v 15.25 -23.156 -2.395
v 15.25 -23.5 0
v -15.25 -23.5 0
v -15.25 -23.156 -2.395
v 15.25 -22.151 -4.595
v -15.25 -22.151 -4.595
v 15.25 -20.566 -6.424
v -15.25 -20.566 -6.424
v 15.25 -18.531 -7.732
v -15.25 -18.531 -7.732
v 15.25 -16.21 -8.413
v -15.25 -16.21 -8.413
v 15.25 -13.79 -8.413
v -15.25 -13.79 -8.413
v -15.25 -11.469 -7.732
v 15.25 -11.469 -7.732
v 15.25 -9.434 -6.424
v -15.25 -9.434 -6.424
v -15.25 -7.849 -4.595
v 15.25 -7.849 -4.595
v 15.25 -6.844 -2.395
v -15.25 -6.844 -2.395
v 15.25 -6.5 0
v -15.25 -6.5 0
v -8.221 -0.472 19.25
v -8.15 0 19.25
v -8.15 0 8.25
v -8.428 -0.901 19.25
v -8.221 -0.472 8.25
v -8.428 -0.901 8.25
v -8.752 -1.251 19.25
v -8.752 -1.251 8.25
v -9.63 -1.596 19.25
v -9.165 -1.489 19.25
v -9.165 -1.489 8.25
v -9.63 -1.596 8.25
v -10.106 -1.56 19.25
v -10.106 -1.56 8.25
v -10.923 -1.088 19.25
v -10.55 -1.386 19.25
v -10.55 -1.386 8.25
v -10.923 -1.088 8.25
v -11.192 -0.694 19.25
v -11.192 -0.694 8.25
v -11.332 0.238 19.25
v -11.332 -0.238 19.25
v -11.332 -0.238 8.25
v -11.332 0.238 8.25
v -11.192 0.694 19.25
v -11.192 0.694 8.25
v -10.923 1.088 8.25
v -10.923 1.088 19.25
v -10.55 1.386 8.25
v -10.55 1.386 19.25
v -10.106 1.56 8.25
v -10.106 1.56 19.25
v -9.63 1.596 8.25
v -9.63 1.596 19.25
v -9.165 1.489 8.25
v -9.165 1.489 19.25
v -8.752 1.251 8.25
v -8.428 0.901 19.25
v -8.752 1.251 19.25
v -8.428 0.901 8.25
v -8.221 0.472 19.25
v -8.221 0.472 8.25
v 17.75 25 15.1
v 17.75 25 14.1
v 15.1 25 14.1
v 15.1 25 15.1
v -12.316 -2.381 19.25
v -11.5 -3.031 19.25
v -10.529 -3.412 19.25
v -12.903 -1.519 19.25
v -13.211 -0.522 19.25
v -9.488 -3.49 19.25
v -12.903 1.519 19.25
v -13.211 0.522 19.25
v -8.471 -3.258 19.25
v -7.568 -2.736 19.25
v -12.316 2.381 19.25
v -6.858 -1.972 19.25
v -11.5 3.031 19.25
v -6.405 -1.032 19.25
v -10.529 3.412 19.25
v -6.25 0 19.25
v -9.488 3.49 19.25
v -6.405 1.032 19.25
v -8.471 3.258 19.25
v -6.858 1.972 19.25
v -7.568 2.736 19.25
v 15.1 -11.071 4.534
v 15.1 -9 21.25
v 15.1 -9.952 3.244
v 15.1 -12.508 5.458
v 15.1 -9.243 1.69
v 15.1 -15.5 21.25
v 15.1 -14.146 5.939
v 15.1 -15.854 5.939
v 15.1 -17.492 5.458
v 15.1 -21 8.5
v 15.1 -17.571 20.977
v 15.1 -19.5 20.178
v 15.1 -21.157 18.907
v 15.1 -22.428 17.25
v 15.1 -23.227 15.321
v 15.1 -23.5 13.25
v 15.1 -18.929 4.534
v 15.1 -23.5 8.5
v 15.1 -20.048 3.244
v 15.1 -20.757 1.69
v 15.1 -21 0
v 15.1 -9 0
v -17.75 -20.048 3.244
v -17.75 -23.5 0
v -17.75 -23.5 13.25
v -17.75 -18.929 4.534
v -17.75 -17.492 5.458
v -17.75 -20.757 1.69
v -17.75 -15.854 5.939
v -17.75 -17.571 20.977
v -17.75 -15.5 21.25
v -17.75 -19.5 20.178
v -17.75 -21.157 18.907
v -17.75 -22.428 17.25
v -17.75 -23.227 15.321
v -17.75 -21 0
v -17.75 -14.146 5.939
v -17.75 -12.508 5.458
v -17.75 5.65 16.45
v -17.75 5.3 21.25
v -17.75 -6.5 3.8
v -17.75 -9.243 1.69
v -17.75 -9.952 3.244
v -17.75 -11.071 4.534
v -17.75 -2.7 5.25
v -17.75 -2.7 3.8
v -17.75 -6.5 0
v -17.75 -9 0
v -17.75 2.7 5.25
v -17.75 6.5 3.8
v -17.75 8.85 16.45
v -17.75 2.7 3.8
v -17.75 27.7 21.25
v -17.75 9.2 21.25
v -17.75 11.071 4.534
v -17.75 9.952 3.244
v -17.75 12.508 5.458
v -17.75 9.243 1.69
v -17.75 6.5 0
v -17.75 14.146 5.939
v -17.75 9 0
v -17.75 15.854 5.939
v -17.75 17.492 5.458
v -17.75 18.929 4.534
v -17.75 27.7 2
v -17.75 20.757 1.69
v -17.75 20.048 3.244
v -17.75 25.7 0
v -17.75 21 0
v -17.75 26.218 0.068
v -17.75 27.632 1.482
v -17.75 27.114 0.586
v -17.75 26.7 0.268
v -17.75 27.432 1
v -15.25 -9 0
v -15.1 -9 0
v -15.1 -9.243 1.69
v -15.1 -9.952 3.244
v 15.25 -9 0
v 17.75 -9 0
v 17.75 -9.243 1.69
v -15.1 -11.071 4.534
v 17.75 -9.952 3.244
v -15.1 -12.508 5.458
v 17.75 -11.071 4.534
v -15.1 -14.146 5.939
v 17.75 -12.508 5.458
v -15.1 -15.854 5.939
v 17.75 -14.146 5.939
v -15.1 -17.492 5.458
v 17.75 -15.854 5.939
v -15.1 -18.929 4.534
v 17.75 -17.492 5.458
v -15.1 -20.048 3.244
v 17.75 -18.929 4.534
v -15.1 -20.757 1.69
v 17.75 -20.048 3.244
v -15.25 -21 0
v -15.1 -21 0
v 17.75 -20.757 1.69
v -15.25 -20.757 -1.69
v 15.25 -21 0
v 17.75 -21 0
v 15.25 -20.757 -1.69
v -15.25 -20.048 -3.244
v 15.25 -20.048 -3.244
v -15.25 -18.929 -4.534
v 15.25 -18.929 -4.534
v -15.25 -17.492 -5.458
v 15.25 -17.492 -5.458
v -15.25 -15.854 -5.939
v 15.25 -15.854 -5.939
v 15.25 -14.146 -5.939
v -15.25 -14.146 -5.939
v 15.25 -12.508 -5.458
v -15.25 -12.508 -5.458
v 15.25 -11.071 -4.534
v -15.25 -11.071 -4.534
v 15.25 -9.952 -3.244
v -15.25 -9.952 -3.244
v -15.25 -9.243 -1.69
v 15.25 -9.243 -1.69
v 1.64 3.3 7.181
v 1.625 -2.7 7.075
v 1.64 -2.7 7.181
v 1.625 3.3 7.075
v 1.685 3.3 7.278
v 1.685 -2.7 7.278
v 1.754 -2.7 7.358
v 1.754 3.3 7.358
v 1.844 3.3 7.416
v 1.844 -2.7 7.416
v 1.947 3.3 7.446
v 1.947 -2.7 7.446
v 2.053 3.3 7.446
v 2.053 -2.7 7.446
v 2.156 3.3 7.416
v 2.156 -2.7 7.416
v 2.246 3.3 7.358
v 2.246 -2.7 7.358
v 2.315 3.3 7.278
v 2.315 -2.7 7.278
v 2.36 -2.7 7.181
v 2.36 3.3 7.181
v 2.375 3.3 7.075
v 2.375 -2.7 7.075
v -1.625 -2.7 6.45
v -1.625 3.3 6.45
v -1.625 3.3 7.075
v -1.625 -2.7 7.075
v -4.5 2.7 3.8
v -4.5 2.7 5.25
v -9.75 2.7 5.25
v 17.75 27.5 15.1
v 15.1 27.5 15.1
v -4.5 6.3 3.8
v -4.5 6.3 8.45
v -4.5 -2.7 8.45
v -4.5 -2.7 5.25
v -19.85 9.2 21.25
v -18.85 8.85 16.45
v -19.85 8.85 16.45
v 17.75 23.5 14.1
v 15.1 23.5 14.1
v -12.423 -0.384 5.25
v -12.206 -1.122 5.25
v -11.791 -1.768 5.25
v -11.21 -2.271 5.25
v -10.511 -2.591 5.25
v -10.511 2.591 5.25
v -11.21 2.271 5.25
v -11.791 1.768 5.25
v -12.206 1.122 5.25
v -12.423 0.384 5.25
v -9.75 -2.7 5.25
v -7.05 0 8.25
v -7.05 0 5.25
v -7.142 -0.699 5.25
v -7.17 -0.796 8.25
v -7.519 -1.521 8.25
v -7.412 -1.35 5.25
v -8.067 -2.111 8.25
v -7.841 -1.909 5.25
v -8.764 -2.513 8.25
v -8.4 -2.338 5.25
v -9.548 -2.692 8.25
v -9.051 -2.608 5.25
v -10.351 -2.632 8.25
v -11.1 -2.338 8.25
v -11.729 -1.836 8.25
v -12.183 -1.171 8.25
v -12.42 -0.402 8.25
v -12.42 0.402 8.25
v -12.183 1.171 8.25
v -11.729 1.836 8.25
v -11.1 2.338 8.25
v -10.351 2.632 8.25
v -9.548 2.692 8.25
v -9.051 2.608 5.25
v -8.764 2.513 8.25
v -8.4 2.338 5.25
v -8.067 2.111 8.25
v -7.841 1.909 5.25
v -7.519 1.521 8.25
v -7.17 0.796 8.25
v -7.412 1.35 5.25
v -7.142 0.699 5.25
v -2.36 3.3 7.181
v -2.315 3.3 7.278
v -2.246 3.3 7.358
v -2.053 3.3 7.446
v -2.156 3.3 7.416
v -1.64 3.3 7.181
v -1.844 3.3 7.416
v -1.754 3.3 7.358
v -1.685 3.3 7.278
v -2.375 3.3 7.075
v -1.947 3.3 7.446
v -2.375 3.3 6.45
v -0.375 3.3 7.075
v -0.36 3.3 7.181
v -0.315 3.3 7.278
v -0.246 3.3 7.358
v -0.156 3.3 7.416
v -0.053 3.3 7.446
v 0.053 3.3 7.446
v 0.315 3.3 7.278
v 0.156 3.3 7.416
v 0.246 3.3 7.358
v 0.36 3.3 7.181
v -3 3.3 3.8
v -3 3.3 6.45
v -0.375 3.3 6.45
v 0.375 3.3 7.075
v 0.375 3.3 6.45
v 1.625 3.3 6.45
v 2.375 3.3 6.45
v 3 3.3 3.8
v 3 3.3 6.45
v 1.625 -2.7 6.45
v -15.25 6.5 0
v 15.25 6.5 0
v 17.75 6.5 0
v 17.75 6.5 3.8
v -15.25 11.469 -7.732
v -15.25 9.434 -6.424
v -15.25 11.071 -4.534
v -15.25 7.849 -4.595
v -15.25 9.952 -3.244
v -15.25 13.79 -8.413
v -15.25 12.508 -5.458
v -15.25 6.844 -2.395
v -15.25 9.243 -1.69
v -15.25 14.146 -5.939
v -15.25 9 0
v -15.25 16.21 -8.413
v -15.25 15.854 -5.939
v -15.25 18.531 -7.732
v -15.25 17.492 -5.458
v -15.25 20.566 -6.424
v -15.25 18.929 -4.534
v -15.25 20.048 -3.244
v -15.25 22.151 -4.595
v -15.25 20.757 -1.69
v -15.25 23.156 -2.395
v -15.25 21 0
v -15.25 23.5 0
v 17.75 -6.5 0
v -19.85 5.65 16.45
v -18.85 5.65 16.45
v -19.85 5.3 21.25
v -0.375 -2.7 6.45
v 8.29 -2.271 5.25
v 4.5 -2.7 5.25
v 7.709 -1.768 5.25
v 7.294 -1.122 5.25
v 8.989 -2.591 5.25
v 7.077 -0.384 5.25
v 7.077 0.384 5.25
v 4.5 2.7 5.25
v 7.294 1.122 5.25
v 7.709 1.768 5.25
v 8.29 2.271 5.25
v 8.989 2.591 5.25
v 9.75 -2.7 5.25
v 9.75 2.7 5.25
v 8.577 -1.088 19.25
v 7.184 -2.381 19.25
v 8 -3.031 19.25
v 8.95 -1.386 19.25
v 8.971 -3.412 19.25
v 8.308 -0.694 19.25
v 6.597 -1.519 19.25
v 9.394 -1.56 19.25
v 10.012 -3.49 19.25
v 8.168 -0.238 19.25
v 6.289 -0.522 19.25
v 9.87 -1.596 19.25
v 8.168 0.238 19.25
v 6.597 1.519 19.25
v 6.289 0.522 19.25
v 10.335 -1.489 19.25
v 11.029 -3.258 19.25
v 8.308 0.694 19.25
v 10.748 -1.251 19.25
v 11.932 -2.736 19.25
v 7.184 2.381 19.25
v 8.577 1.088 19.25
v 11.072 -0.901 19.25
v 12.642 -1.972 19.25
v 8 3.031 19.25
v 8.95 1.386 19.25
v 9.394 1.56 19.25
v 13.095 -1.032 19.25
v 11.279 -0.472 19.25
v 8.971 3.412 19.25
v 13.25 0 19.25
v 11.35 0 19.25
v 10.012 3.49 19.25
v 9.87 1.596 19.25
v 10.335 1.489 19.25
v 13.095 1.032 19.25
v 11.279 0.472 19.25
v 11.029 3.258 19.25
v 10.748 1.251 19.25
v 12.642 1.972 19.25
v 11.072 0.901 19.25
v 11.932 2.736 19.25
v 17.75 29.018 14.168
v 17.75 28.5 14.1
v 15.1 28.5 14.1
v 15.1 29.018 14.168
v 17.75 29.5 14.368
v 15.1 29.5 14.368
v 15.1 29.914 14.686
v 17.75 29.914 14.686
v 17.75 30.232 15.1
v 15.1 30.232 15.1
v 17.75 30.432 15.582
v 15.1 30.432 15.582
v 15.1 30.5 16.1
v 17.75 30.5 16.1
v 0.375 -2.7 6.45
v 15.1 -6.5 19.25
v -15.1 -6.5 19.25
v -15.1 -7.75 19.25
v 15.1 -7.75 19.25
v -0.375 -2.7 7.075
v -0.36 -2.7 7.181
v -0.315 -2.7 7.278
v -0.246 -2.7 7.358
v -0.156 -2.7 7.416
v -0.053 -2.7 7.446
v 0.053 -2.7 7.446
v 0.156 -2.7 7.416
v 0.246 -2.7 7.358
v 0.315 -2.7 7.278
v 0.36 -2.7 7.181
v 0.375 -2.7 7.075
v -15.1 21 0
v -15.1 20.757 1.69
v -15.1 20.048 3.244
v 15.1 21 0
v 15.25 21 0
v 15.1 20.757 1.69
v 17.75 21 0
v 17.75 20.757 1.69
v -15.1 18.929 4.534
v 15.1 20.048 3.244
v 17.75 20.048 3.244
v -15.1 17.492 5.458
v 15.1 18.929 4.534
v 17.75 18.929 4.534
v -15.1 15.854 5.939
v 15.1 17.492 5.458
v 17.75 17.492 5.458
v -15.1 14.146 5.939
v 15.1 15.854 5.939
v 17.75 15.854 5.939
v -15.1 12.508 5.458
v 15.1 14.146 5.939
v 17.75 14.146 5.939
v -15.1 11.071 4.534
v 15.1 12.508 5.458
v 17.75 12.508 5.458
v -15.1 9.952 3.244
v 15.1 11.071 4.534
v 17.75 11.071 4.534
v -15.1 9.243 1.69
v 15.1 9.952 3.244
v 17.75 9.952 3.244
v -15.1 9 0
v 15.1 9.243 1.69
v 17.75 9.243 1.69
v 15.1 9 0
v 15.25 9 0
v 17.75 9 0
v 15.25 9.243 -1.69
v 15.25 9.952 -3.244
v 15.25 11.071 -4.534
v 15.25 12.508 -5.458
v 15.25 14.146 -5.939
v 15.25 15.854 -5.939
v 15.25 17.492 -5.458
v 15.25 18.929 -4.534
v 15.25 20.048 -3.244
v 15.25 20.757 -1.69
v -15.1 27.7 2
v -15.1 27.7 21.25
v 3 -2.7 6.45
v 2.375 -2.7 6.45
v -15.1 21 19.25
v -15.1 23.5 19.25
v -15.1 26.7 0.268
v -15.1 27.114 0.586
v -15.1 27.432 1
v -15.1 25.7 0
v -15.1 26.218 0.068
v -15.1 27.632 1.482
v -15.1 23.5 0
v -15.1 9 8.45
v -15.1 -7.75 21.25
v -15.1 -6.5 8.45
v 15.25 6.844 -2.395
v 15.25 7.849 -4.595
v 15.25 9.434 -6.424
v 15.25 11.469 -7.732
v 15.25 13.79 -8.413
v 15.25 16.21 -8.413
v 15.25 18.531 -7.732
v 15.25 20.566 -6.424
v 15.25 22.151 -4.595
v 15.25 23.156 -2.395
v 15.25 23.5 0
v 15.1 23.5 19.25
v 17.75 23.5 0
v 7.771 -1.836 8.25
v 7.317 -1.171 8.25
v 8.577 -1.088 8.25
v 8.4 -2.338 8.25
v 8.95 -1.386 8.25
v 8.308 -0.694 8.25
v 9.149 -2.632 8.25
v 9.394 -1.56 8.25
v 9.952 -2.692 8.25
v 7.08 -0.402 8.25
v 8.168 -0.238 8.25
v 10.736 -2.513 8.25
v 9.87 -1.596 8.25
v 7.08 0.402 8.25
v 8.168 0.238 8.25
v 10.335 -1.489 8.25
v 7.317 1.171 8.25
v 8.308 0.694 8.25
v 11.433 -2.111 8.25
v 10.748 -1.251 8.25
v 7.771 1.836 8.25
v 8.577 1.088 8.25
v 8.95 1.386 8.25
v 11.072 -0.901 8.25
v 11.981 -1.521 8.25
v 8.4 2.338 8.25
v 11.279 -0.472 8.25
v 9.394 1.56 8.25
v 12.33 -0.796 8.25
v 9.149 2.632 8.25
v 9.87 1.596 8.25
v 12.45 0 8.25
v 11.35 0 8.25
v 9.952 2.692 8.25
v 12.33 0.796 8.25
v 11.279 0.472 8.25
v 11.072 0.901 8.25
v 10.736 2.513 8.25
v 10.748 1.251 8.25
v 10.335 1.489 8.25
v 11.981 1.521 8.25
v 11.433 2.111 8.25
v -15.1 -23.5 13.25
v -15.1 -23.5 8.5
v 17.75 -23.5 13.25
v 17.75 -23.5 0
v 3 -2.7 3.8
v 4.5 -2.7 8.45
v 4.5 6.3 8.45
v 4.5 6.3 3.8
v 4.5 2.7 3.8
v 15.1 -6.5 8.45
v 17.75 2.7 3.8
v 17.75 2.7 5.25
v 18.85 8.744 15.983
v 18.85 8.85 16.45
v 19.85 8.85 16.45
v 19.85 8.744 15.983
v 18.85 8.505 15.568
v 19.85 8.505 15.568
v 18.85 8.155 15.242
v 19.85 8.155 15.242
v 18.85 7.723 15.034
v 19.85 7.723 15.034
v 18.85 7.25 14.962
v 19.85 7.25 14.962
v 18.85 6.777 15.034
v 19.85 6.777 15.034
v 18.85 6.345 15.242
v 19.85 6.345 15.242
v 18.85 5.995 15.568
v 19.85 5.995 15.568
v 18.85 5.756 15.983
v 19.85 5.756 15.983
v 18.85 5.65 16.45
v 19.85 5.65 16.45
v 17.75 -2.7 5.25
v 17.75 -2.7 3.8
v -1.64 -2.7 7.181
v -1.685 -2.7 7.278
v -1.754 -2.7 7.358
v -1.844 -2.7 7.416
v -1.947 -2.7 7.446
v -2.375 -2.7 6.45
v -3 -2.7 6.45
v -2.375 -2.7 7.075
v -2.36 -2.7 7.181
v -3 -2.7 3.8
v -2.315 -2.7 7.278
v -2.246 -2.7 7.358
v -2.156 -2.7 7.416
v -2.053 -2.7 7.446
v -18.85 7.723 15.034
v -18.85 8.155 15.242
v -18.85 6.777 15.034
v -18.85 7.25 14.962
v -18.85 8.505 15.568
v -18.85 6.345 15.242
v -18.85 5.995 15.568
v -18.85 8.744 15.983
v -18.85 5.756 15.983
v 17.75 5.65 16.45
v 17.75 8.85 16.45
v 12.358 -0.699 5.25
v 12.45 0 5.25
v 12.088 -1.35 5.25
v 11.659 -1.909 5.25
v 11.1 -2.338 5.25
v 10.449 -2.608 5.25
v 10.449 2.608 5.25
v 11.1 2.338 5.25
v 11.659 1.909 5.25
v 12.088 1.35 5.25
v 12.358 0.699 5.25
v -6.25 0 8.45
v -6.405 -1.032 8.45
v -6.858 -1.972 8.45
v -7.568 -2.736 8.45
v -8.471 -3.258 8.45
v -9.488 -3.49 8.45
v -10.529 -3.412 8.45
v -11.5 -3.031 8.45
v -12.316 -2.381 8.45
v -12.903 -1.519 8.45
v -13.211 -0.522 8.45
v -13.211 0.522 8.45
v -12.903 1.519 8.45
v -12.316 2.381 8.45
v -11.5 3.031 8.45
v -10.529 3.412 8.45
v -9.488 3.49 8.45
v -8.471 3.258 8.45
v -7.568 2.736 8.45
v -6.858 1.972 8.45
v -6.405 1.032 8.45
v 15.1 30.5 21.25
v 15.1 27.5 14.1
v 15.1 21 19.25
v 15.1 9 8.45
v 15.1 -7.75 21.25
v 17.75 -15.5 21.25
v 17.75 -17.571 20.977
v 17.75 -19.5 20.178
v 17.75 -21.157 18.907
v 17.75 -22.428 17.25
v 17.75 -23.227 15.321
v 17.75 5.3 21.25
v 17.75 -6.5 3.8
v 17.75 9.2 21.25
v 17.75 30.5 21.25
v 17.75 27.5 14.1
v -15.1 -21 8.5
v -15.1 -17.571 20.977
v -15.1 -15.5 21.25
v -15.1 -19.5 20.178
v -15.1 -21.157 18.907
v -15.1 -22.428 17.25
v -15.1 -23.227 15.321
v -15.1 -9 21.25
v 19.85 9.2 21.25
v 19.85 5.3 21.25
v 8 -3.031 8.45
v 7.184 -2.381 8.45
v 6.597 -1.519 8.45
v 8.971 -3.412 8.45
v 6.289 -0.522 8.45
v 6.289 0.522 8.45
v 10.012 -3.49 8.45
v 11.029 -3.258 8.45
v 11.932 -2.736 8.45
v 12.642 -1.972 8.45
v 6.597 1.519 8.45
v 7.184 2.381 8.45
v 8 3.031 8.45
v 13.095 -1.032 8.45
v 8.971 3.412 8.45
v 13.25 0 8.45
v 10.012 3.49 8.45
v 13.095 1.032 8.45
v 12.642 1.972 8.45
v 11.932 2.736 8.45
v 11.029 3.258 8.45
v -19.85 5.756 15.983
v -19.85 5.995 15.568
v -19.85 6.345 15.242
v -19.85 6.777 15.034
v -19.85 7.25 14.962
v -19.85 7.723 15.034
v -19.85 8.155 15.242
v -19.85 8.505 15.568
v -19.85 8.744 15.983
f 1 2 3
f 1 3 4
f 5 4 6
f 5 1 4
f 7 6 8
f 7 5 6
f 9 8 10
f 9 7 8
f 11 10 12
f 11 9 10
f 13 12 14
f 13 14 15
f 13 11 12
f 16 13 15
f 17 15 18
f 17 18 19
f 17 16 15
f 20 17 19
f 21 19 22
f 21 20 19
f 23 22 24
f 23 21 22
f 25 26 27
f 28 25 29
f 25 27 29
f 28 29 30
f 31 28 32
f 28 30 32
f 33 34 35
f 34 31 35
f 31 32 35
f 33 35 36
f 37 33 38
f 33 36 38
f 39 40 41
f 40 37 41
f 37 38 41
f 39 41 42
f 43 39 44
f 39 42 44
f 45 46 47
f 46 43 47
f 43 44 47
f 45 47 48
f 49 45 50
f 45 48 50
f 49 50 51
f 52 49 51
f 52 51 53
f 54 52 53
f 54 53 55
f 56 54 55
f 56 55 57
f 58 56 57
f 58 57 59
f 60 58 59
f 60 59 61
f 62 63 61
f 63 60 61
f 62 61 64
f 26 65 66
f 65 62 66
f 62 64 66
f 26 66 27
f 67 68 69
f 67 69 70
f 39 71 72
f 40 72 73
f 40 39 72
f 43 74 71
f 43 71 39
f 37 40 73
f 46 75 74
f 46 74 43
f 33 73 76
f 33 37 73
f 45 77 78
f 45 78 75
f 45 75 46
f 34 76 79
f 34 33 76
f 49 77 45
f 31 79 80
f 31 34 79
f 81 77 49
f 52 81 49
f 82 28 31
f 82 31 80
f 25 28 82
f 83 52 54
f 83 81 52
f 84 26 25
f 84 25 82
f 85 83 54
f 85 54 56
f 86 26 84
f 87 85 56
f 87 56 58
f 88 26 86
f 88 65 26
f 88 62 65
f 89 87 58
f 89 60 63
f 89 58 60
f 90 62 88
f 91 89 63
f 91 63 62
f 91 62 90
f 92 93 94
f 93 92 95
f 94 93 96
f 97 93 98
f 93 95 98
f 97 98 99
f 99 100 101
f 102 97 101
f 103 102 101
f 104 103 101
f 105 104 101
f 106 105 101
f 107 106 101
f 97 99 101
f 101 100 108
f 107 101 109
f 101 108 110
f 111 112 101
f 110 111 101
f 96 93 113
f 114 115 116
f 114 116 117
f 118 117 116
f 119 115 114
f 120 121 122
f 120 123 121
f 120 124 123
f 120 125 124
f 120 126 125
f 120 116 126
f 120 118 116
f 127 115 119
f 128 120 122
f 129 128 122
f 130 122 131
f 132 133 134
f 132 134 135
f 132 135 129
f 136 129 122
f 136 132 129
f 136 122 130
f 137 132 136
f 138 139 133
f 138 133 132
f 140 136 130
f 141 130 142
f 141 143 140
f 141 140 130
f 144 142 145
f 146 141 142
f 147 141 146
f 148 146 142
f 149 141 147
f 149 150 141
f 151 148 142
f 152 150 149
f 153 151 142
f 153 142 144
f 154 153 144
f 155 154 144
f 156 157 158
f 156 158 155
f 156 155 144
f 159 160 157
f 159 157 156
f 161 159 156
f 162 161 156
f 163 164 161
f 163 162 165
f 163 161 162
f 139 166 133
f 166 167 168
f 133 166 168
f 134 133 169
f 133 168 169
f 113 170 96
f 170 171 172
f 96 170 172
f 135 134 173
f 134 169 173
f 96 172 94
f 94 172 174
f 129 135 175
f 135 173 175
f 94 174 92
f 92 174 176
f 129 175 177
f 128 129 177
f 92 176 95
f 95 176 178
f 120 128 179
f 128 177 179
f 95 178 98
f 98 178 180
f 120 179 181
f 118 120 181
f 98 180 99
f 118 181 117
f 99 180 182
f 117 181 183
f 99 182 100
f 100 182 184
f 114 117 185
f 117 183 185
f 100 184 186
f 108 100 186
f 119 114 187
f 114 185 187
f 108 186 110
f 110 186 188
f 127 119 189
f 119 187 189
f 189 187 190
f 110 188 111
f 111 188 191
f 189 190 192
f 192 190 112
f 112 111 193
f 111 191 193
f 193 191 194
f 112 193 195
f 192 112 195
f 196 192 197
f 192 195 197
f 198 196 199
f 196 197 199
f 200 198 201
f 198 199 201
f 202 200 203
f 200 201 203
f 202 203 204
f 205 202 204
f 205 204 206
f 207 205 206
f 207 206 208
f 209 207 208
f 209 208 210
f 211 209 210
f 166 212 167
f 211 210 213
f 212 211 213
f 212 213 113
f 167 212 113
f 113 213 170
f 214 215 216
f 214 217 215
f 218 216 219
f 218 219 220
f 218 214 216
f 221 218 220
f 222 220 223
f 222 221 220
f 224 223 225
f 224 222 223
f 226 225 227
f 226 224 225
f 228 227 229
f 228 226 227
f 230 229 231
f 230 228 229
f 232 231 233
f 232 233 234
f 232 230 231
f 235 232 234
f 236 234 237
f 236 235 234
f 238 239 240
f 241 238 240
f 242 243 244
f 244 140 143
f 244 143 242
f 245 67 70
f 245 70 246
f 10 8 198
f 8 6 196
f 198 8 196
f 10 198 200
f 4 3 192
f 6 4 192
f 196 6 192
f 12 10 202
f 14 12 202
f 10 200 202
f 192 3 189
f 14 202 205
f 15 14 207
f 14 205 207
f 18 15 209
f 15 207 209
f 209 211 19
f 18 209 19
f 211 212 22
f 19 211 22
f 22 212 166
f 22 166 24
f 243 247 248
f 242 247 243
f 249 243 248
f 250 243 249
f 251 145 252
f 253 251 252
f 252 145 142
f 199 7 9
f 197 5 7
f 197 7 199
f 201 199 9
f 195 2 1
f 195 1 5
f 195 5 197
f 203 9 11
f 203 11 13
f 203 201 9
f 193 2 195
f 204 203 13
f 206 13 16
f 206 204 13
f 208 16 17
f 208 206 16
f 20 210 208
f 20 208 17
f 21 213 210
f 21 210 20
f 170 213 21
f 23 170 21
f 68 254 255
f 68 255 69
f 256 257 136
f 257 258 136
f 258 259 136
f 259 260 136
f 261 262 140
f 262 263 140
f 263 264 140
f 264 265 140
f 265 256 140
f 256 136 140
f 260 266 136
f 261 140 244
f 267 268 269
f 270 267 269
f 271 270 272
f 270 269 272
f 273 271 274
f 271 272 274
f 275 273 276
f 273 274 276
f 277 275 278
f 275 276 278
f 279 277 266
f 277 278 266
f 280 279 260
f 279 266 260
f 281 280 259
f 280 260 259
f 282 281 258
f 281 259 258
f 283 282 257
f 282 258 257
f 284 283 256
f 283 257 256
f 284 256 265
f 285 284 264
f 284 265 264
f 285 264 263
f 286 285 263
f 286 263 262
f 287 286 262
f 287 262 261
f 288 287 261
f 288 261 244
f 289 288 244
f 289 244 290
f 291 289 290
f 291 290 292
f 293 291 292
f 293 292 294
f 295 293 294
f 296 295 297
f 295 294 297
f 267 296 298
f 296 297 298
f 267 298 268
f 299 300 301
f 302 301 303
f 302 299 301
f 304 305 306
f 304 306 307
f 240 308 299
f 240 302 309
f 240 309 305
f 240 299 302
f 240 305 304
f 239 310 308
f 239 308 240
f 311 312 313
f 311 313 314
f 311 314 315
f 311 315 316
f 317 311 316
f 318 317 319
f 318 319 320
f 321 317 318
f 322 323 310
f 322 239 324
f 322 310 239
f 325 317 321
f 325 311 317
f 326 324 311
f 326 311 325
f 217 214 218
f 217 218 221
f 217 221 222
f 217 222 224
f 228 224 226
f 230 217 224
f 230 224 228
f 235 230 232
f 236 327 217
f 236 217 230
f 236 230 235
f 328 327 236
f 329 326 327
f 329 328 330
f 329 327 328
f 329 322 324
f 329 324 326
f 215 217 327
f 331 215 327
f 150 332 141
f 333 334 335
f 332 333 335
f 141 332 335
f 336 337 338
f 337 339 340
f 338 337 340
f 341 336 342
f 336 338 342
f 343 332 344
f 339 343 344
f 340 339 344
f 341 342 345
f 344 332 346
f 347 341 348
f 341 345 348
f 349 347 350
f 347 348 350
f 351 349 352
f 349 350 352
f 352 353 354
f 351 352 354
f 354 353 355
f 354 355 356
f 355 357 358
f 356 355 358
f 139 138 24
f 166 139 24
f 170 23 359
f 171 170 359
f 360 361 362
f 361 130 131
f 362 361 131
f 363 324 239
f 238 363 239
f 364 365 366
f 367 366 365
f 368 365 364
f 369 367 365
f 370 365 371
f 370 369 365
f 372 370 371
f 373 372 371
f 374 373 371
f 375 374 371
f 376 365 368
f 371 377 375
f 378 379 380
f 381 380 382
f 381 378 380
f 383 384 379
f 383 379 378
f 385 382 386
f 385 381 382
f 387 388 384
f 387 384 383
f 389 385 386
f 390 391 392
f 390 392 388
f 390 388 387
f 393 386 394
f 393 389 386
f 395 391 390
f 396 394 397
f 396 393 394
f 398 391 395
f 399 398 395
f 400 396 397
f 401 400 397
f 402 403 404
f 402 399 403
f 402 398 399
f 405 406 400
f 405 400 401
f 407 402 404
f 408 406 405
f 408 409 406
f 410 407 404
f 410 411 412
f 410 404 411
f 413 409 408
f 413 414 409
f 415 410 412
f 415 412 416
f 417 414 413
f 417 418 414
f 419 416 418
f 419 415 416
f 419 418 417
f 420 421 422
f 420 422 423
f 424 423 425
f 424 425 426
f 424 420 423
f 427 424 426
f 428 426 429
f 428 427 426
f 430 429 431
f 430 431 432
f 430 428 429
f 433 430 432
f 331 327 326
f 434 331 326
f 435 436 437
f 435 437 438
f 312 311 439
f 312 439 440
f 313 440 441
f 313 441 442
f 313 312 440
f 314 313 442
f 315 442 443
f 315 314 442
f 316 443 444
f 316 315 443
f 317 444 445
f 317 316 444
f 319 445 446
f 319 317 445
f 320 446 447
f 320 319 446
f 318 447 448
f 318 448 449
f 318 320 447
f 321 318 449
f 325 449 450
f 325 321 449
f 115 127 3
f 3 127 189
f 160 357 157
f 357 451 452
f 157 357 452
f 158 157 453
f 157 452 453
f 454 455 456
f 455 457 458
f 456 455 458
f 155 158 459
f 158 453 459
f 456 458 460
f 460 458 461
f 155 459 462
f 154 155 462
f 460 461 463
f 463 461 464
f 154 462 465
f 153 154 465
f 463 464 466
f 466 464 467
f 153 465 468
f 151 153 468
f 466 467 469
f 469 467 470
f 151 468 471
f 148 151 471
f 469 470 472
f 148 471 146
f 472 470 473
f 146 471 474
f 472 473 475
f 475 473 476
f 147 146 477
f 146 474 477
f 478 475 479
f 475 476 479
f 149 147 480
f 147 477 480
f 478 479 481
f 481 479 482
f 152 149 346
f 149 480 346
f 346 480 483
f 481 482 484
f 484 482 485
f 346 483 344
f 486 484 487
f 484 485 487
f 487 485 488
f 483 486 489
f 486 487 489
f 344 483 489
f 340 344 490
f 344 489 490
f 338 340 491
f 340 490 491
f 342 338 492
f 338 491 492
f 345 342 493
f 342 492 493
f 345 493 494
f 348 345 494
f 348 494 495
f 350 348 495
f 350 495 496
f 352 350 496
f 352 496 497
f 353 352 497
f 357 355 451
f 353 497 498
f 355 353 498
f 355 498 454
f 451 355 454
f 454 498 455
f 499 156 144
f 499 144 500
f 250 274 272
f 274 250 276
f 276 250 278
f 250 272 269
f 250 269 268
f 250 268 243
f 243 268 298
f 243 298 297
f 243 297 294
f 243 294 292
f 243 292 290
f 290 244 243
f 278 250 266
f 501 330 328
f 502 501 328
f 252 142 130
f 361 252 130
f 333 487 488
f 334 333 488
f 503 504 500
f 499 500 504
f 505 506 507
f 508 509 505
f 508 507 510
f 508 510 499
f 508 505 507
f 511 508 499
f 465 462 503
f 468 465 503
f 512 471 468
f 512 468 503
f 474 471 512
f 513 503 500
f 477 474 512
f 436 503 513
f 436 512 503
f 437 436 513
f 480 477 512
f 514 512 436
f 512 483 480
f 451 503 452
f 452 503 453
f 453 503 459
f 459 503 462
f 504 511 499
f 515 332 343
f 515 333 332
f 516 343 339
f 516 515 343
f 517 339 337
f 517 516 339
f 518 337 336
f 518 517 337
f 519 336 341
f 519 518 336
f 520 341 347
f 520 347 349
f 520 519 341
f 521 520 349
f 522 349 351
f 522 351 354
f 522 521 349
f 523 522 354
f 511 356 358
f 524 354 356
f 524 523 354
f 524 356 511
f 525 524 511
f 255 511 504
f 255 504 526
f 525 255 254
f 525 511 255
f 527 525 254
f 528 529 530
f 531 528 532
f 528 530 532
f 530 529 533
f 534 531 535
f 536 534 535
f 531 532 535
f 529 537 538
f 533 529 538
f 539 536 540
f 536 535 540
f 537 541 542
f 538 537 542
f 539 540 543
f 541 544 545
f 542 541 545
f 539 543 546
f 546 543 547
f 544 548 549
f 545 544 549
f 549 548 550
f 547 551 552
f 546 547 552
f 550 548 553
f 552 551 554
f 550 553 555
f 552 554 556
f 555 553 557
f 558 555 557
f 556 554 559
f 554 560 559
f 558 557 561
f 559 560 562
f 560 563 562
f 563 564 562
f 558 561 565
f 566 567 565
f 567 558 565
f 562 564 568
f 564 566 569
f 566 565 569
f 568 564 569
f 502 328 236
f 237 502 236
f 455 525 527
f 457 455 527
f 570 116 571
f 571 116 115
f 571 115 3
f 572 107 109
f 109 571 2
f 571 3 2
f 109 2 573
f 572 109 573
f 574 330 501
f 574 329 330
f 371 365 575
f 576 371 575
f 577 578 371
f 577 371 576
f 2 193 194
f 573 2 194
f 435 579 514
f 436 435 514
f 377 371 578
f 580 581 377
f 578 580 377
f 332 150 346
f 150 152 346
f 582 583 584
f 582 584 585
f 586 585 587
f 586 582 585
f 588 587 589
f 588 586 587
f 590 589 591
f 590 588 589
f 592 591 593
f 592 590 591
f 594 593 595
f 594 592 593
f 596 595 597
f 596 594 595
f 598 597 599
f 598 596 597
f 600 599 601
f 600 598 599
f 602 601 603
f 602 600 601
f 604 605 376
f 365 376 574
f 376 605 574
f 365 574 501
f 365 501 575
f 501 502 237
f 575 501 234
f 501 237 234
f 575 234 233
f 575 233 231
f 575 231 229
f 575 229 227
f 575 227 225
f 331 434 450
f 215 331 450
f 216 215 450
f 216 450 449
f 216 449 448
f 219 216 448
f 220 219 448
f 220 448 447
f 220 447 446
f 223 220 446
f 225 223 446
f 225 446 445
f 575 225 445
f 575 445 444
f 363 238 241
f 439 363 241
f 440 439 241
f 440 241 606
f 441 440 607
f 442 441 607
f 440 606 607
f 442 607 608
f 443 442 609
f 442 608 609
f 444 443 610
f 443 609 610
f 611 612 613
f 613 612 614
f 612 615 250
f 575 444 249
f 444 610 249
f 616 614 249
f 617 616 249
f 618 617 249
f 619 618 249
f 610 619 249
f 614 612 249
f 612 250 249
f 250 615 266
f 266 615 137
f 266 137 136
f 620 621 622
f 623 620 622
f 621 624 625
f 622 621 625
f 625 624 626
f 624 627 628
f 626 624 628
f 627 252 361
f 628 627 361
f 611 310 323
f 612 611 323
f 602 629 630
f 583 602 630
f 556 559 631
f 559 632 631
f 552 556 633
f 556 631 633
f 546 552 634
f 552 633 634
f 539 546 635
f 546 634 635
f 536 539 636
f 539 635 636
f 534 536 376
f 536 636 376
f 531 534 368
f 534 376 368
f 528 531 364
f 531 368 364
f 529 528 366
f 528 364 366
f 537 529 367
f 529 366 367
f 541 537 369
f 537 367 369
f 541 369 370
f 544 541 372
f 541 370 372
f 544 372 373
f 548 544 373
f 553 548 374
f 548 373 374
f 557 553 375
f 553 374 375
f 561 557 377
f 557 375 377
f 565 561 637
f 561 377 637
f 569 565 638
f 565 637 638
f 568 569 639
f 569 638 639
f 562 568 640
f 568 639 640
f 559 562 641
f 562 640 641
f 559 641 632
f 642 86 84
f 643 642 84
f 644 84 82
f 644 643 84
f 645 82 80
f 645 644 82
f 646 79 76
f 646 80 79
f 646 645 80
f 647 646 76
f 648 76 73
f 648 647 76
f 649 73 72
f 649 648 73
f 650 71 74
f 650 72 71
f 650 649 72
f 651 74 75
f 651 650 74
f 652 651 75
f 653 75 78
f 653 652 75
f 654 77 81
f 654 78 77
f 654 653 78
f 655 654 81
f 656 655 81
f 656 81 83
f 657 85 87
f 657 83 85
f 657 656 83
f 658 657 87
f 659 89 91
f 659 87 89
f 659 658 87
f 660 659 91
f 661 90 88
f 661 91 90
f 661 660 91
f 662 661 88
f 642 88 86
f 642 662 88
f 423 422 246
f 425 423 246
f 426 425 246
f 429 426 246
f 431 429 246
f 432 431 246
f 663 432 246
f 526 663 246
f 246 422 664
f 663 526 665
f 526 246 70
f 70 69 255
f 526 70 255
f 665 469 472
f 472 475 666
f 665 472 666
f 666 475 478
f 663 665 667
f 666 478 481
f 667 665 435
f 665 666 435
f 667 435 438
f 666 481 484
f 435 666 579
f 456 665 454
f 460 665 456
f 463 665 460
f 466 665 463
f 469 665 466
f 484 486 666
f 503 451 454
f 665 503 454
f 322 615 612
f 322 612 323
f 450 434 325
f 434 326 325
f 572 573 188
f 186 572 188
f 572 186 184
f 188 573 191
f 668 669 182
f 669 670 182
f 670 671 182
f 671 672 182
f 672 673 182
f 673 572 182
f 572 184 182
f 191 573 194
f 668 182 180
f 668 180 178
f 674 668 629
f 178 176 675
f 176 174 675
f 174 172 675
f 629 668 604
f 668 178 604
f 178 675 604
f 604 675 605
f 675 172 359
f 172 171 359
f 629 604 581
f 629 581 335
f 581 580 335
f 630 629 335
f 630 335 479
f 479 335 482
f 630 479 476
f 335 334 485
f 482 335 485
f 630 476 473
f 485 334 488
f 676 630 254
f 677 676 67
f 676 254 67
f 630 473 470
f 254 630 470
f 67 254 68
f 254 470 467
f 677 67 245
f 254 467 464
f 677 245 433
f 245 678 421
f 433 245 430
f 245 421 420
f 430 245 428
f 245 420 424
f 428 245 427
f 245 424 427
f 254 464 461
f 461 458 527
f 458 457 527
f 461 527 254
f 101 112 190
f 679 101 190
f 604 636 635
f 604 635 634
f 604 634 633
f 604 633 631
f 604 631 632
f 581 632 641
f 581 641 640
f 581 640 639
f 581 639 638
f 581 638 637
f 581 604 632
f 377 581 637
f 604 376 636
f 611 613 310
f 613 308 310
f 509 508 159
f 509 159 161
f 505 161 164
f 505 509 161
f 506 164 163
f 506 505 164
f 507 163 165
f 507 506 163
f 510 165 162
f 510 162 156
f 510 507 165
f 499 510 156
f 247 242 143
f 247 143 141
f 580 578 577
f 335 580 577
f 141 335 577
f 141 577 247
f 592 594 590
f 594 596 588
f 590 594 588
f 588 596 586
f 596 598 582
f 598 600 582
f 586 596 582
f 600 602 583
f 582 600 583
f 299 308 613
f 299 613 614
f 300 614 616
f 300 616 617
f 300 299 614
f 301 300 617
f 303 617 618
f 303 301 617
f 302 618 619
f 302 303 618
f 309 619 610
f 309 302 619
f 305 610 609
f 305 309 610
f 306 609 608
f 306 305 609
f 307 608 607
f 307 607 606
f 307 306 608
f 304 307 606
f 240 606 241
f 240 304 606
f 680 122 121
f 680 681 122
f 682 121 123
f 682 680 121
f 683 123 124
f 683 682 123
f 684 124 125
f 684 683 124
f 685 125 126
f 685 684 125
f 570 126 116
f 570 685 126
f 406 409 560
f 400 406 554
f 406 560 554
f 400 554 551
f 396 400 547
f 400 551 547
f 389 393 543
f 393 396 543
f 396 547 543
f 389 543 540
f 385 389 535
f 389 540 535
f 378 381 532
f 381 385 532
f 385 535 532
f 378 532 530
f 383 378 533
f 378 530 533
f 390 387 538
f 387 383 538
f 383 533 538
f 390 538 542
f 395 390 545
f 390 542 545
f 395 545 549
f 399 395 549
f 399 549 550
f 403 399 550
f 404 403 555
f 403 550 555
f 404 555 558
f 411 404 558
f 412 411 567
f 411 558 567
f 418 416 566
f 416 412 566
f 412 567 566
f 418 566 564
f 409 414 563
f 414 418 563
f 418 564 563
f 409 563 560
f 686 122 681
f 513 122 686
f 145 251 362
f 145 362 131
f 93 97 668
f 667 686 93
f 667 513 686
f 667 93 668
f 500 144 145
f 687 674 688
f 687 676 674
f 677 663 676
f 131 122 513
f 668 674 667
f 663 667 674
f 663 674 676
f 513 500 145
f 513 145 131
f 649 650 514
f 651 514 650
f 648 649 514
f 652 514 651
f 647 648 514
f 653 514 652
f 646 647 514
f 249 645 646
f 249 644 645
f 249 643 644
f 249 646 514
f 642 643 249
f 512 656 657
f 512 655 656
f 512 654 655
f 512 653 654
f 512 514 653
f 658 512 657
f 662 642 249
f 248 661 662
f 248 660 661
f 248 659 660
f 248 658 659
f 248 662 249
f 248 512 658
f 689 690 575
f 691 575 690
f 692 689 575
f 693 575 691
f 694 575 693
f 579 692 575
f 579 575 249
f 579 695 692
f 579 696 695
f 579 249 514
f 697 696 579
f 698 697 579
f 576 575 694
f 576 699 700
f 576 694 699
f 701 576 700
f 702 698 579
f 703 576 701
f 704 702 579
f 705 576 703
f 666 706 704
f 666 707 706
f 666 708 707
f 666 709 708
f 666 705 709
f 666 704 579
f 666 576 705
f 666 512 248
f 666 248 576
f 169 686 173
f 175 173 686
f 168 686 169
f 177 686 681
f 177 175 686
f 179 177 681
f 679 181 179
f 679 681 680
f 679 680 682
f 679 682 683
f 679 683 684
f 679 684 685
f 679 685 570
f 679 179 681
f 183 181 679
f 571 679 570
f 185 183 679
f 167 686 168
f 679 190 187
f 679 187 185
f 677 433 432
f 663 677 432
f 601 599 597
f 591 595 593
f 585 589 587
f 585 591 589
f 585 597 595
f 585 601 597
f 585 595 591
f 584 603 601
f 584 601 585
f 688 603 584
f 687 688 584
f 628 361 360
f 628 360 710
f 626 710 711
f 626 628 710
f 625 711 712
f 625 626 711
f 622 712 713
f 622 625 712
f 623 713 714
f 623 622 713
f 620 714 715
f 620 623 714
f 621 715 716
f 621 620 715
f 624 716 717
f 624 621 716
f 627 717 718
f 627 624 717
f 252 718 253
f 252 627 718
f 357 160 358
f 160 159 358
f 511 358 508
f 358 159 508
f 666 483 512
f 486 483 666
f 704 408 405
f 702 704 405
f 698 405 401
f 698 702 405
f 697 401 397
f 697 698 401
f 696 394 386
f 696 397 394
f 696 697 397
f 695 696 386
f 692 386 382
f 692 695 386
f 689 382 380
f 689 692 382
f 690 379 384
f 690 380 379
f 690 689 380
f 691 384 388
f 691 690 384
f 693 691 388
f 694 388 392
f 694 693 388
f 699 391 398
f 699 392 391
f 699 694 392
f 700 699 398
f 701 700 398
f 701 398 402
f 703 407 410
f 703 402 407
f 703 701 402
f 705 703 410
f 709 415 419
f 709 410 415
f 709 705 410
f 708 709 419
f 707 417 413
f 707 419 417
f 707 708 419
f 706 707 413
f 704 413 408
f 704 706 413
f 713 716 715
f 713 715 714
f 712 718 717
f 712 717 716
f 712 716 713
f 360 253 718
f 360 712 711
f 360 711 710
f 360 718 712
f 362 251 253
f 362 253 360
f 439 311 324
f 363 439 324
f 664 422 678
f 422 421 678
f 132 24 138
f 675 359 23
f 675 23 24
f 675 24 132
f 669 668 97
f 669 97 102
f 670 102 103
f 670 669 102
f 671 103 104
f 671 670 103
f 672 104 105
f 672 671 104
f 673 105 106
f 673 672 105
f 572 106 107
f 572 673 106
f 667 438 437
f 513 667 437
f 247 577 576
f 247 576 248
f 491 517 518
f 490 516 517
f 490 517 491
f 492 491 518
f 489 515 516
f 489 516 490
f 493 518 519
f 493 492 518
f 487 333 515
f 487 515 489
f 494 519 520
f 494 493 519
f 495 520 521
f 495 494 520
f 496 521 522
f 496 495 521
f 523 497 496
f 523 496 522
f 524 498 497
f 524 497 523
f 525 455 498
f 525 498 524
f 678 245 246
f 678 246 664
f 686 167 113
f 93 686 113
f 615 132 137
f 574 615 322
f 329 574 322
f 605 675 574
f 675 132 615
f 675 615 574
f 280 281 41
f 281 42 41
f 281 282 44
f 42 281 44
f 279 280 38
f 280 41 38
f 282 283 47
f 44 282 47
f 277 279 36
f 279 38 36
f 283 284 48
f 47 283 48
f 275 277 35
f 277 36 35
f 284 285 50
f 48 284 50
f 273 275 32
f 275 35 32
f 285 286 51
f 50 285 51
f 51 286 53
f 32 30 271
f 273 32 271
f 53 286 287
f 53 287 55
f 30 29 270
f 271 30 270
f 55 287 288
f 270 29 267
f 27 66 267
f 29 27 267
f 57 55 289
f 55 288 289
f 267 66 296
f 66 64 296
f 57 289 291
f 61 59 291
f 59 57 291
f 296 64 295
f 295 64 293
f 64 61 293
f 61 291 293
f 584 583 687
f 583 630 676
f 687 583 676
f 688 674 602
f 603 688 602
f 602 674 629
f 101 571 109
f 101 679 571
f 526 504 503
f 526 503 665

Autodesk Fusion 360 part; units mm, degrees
sketch "Sketch1" plane through (0, 0, 0) normal (0, 0, 1) x (1, 0, 0) in component "LM6LUU"
  circle A0 centre (0, 0) radius 6
  circle A1 centre (0, 0) radius 3
  dimension "d1" = 12
  dimension "d2" = 6
extrude "Extrude1" add sketch "Sketch1" along normal blind 34 makes body 1 in component "LM6LUU"
copy_body "CutPasteBodies1" bodies 1 removing the originals makes body 2 in component "LM6LUU"
component "LM6LUU" placed x (1, 0, 0) y (0, 1, 0) z (0, 0, 1) at (0, 0, 0)

Autodesk Fusion 360 part; units mm, degrees
sketch "Back" plane through (0, 0, 0) normal (0, 0, 1) x (1, 0, 0) in component "X Carriage"
  line L0 (17.75, 23.5) -> (-17.75, 23.5) construction
  line L1 (-17.75, 23.5) -> (-17.75, -23.5)
  line L2 (-17.75, -23.5) -> (17.75, -23.5)
  line L3 (17.75, -23.5) -> (17.75, 23.5)
  line L4 (0, 23.5) -> (0, -23.5) construction
  line L5 (-17.75, 23.5) -> (-17.75, 27.7)
  line L6 (-17.75, 27.7) -> (-15.1, 27.7)
  line L7 (17.75, 23.5) -> (17.75, 30.5)
  line L8 (17.75, 30.5) -> (15.1, 30.5)
  line L9 (15.1, 30.5) -> (15.1, 23.5)
  line L10 (-15.1, 27.7) -> (-15.1, 23.5)
  line L11 (-15.1, 23.5) -> (15.1, 23.5)
  line L12 (-15.1, 21) -> (15.1, 21)
  line L13 (15.1, 21) -> (15.1, -6.5)
  line L14 (15.1, -6.5) -> (-15.1, -6.5)
  line L15 (-15.1, -6.5) -> (-15.1, 21)
  line L16 (-15.1, -9) -> (15.1, -9)
  line L17 (15.1, -9) -> (15.1, -23.5)
  line L18 (-15.1, -9) -> (-15.1, -23.5)
  line L19 (15.1, -21) -> (-15.1, -21)
  line L20 (-9.75, 0) -> (9.75, 0) construction
  circle A0 centre (-9.75, 0) radius 1.6
  circle A1 centre (9.75, 0) radius 1.6
  circle A2 centre (-9.75, 0) radius 3.5
  circle A3 centre (9.75, 0) radius 3.5
  line L21 (15.1, -7.75) -> (-15.1, -7.75)
  line L22 (-15.1, -7.75) -> (-15.1, -6.5)
  line L23 (15.1, -7.75) -> (15.1, -6.5)
  line L24 (17.75, 9.2) -> (19.75, 9.2)
  line L25 (19.75, 9.2) -> (19.75, 5.3)
  line L26 (19.75, 5.3) -> (17.75, 5.3)
  line L27 (-17.75, 9.2) -> (-19.75, 9.2)
  line L28 (-19.75, 9.2) -> (-19.75, 5.3)
  line L29 (-19.75, 5.3) -> (-17.75, 5.3)
  line L30 (-4.5, -2.7) -> (4.5, -2.7)
  line L31 (4.5, -2.7) -> (4.5, 6.3)
  line L32 (4.5, 6.3) -> (-4.5, 6.3)
  line L33 (-4.5, 6.3) -> (-4.5, -2.7)
  line L34 (-3, -2.7) -> (-3, 3.3)
  line L35 (-3, 3.3) -> (3, 3.3)
  line L36 (3, 3.3) -> (3, -2.7)
  circle A4 centre (9.75, 0) radius 2.7
  circle A5 centre (-9.75, 0) radius 2.7
  line L37 (-15.1, 21) -> (-15.1, 23.5)
  line L38 (15.1, 21) -> (15.1, 23.5)
  line L39 (-15.1, 9) -> (15.1, 9)
  point P0 (0, 21)
  point P1 (0, -2.7)
  point P2 (0, 3.3)
  dimension "d1" = 35.5
  dimension "d2" = 47
  dimension "d3" = 4.2
  dimension "d5" = 7
  dimension "d7" = 30.2
  dimension "d8" = 27.5
  dimension "d9" = 2.5
  dimension "d10" = 2.5
  dimension "d11" = 2.5
  dimension "d12" = 19.5
  dimension "d13" = 3.2
  dimension "d14" = 3.2
  dimension "d15" = 7
  dimension "d16" = 7
  dimension "d17" = 21
  dimension "d18" = 1.25
  dimension "d20" = 3.9
  dimension "d21" = 2
  dimension "d22" = 28.8
  dimension "d23" = 9
  dimension "d24" = 9
  dimension "d25" = 6
  dimension "d26" = 6
  dimension "d27" = 5.4
  dimension "d28" = 5.4
  dimension "d37" = 12
extrude "Extrude1" add sketch "Back" along normal blind 21.25 contours L1 L2 L3 L5 L6 L7 L8 L9 L10 L13 L15 L16 L17 L18 L21 L22 L23 L37 L38 makes body 1 in component "X Carriage"
extrude "Extrude2" add sketch "Back" along normal blind 19.25 contours L11 L12 L37 L38 | L14 L21 L22 L23 | A2 | A3 | A4 | A5 bodies 1 makes body 2 at (13.2326, -0.3485, 12.8333) makes body 3 at (-6.2674, -0.3485, 12.8333) in component "X Carriage"
extrude "Extrude3" add sketch "Back" along normal blind 8.5 contours L2 L17 L18 L19 bodies 1 in component "X Carriage"
extrude "Extrude4" add sketch "Back" along normal blind 8.45 contours L13 L14 L15 L39 | L30 L34 L35 L36 bodies 1 2 3 in component "X Carriage"
sketch "Side" plane through (17.75, 0, 0) normal (1, 0, 0) x (0, 1, 0) in component "X Carriage"
  line L0 (-23.5, 0) -> (30.5, 0) construction
  line L1 (30.5, 21.25) -> (-23.5, 21.25) construction
  line L2 (-23.5, 21.25) -> (-23.5, 0) construction
  circle A0 centre (15, 0) radius 6
  circle A1 centre (-15, 0) radius 6
  circle A2 centre (-15, 0) radius 8.5
  circle A3 centre (15, 0) radius 8.5
  line L3 (23.5, 0) -> (23.5, 19.25) construction
  line L4 (9, 8.45) -> (-6.5, 8.45) construction
  line L5 (9, 0) -> (9, 8.45) construction
  line L6 (-9, 0) -> (-9, 21.25) construction
  line L7 (-6.5, 8.45) -> (-6.5, 19.25) construction
  line L8 (-6.5, 0) -> (-6.5, 3.8)
  line L9 (6.5, 0) -> (6.5, 3.8)
  line L10 (-6.5, 3.8) -> (6.5, 3.8)
  line L11 (-6.5, 0) -> (6.5, 0)
  line L12 (-2.7, 3.8) -> (-2.7, 5.25)
  line L13 (-2.7, 5.25) -> (2.7, 5.25)
  line L14 (2.7, 5.25) -> (2.7, 3.8)
  line L15 (0, 5.25) -> (0, 3.8) construction
  line L16 (-23.5, 0) -> (23.5, 0)
  line L17 (30.5, 21.25) -> (30.5, 16.1)
  line L18 (28.5, 14.1) -> (23.5, 14.1) construction
  line L19 (25, 15.1) -> (27.5, 15.1)
  line L20 (23.5, 14.1) -> (25, 14.1)
  line L21 (25, 14.1) -> (25, 15.1)
  line L22 (27.5, 15.1) -> (27.5, 14.1)
  line L23 (30.5, 14.1) -> (27.5, 14.1) construction
  arc A4 (28.5, 14.1) -> (30.5, 16.1) centre (28.5, 16.1) ccw
  line L24 (30.5, 16.1) -> (30.5, 0)
  line L25 (30.5, 0) -> (23.5, 0)
  line L26 (23.5, 0) -> (23.5, 14.1)
  line L27 (28.5, 14.1) -> (27.5, 14.1)
  line L28 (30.5, 0) -> (30.5, 21.25)
  dimension "d38" = 12
  dimension "d39" = 12
  dimension "d40" = 17
  dimension "d41" = 17
  dimension "d42" = 30
  dimension "d43" = 3.8
  dimension "d44" = 3.8
  dimension "d45" = 1.45
  dimension "d46" = 13
  dimension "d47" = 5.4
  dimension "d48" = 7.15
  dimension "d49" = 2.5
  dimension "d50" = 1.5
  dimension "d51" = 1
  dimension "d52" = 7
  dimension "d53" = 2
extrude "Extrude5" cut sketch "Side" against normal blind 35.5 contours A0 L16 | A0 L16 | L8 L9 L10 L11 L16 | A1 L16 | A1 L16 bodies 1 in component "X Carriage"
extrude "Extrude6" add sketch "Side" along normal blind -33 and the other way blind 2.5 contours A0 A3 L16 | A1 A2 L16 picked at (22.635, -0.4223) picked at (-7.3873, -0.7204) bodies 1 in component "X Carriage"
extrude "Extrude7" cut sketch "Side" against normal blind 2.65 contours L19 L20 L21 L22 A4 L24 L25 L26 L27 L28 bodies 1 in component "X Carriage"
fillet "Fillet1" radius 2 1 edges at (-16.425, 27.7, 0) on bodies 1 in component "X Carriage"
fillet "Fillet2" radius 8 3 edges at (16.425, -23.5, 21.25) (-16.425, -23.5, 21.25) (16.425, -23.5, 21.25) on bodies 1 in component "X Carriage"
extrude "Extrude8" cut sketch "Side" against normal blind 14 contours L10 L12 L13 L14 bodies 1 in component "X Carriage"
extrude "Extrude9" cut sketch "Side" along normal blind 14 from surface at -35.5 contours L10 L12 L13 L14 bodies 1 in component "X Carriage"
extrude "Extrude10" cut sketch "Back" along normal blind 3 from surface at 5.25 contours A4 | A5 bodies 1 in component "X Carriage"
sketch "Belt Catch" plane through (0, 3.3, 0) normal (0, 1, 0) x (-1, 0, 0) in component "X Carriage"
  line L0 (-3, 3.8) -> (3, 3.8)
  line L1 (3, 3.8) -> (3, 8.45)
  line L2 (3, 8.45) -> (-3, 8.45)
  line L3 (-3, 8.45) -> (-3, 3.8)
  line L4 (-3, 8.45) -> (3, 8.45)
  line L5 (-3, 3.8) -> (-3, 8.45)
  line L6 (3, 3.8) -> (3, 8.45)
  line L7 (-3, 3.8) -> (3, 3.8)
  line L8 (-3, 6.45) -> (3, 6.45)
  line L9 (0, 6.45) -> (0, 8.45) construction
  line L10 (-0.375, 6.45) -> (-0.375, 7.075)
  line L11 (-0.375, 7.075) -> (0.375, 7.075) construction
  line L12 (0.375, 7.075) -> (0.375, 6.45)
  arc A0 (0.375, 7.075) -> (-0.375, 7.075) centre (0, 7.075) ccw
  line L13 (-1.625, 7.075) -> (-1.625, 6.45)
  arc A1 (-1.625, 7.075) -> (-2.375, 7.075) centre (-2, 7.075) ccw
  line L14 (-2.375, 6.45) -> (-2.375, 7.075)
  line L15 (2.375, 7.075) -> (2.375, 6.45)
  arc A2 (2.375, 7.075) -> (1.625, 7.075) centre (2, 7.075) ccw
  line L16 (1.625, 6.45) -> (1.625, 7.075)
  point P0 (0, 7.075)
  dimension "d72" = 2
  dimension "d73" = 0.625
  dimension "d74" = 0.75
  dimension "d77" = 2
  dimension "d78" = 0
extrude "Extrude11" cut sketch "Belt Catch" against normal blind 6 contours L1 L2 L3 L4 L5 L6 L8 L10 L12 A0 L13 A1 L14 L15 A2 L16 bodies 1 in component "X Carriage"
sketch "Sping Catch" plane through (-17.75, 0, 0) normal (-1, 0, 0) x (0, -1, 0) in component "X Carriage"
  line L0 (-2.7, 3.8) -> (-2.7, 5.25)
  line L1 (-2.7, 5.25) -> (2.7, 5.25)
  line L2 (2.7, 5.25) -> (2.7, 3.8)
  line L3 (2.7, 3.8) -> (6.5, 3.8)
  line L4 (6.5, 3.8) -> (6.5, 0)
  line L5 (6.5, 0) -> (9, 0)
  arc A0 (21, 0) -> (9, 0) centre (15, 0) ccw
  line L6 (21, 0) -> (23.5, 0)
  line L7 (23.5, 0) -> (23.5, 13.25)
  arc A1 (23.5, 13.25) -> (15.5, 21.25) centre (15.5, 13.25) ccw
  line L8 (15.5, 21.25) -> (-27.7, 21.25)
  line L9 (-27.7, 21.25) -> (-27.7, 2)
  arc A2 (-27.7, 2) -> (-25.7, 0) centre (-25.7, 2) ccw
  line L10 (-25.7, 0) -> (-21, 0)
  arc A3 (-9, 0) -> (-21, 0) centre (-15, 0) ccw
  line L11 (-9, 0) -> (-6.5, 0)
  line L12 (-6.5, 0) -> (-6.5, 3.8)
  line L13 (-6.5, 3.8) -> (-2.7, 3.8)
  line L14 (-27.7, 2) -> (-27.7, 21.25)
  line L15 (-27.7, 21.25) -> (15.5, 21.25)
  line L16 (-9.2, 21.25) -> (-8.85, 16.45)
  line L17 (-8.85, 16.45) -> (-5.65, 16.45)
  line L18 (-5.65, 16.45) -> (-5.3, 21.25)
  line L19 (-9.2, 21.25) -> (-5.3, 21.25)
  line L20 (-7.25, 21.25) -> (-7.25, 16.45) construction
  arc A4 (-8.85, 16.45) -> (-5.65, 16.45) centre (-7.25, 16.5667) ccw
  line L21 (-5.3, 0) -> (-5.3, 21.25) construction
  line L22 (-9.2, 0) -> (-9.2, 21.25) construction
  arc A5 (-8.9229, 17.45) -> (-5.5771, 17.45) centre (-7.25, 18.3493) ccw
  point P0 (-9.2, 0)
  point P1 (-5.3, 0)
  dimension "d82" = 3.2
  dimension "d83" = 4.8
  dimension "d84" = 1.6026
  dimension "d91" = 3.9
  dimension "d92" = 1
extrude "Extrude12" add sketch "Sping Catch" along normal blind 2.1 contours L8 L15 L16 L18 L19 A5 | L16 L17 A5 | L17 L18 A5 | L17 A4 bodies 1 in component "X Carriage"
extrude "Extrude13" cut sketch "Sping Catch" along normal blind 1.1 contours L17 A4 bodies 1 in component "X Carriage"
mirror "Mirror1" about plane through (0, 0, 0) normal (1, 0, 0) of "Extrude12", "Extrude13" in component "X Carriage"
component "X Carriage" placed x (1, 0, 0) y (0, 1, 0) z (0, 0, 1) at (0, 0, 0)
equation "d31 = 21.25 mm - 2 mm"
equation "d35 = 21.25 mm - 12.8 mm"
equation "d56 = -35.50 mm + 2.5 mm"
equation "d73 = 1 mm - ( 0.75 / 2 ) * 1 mm"
